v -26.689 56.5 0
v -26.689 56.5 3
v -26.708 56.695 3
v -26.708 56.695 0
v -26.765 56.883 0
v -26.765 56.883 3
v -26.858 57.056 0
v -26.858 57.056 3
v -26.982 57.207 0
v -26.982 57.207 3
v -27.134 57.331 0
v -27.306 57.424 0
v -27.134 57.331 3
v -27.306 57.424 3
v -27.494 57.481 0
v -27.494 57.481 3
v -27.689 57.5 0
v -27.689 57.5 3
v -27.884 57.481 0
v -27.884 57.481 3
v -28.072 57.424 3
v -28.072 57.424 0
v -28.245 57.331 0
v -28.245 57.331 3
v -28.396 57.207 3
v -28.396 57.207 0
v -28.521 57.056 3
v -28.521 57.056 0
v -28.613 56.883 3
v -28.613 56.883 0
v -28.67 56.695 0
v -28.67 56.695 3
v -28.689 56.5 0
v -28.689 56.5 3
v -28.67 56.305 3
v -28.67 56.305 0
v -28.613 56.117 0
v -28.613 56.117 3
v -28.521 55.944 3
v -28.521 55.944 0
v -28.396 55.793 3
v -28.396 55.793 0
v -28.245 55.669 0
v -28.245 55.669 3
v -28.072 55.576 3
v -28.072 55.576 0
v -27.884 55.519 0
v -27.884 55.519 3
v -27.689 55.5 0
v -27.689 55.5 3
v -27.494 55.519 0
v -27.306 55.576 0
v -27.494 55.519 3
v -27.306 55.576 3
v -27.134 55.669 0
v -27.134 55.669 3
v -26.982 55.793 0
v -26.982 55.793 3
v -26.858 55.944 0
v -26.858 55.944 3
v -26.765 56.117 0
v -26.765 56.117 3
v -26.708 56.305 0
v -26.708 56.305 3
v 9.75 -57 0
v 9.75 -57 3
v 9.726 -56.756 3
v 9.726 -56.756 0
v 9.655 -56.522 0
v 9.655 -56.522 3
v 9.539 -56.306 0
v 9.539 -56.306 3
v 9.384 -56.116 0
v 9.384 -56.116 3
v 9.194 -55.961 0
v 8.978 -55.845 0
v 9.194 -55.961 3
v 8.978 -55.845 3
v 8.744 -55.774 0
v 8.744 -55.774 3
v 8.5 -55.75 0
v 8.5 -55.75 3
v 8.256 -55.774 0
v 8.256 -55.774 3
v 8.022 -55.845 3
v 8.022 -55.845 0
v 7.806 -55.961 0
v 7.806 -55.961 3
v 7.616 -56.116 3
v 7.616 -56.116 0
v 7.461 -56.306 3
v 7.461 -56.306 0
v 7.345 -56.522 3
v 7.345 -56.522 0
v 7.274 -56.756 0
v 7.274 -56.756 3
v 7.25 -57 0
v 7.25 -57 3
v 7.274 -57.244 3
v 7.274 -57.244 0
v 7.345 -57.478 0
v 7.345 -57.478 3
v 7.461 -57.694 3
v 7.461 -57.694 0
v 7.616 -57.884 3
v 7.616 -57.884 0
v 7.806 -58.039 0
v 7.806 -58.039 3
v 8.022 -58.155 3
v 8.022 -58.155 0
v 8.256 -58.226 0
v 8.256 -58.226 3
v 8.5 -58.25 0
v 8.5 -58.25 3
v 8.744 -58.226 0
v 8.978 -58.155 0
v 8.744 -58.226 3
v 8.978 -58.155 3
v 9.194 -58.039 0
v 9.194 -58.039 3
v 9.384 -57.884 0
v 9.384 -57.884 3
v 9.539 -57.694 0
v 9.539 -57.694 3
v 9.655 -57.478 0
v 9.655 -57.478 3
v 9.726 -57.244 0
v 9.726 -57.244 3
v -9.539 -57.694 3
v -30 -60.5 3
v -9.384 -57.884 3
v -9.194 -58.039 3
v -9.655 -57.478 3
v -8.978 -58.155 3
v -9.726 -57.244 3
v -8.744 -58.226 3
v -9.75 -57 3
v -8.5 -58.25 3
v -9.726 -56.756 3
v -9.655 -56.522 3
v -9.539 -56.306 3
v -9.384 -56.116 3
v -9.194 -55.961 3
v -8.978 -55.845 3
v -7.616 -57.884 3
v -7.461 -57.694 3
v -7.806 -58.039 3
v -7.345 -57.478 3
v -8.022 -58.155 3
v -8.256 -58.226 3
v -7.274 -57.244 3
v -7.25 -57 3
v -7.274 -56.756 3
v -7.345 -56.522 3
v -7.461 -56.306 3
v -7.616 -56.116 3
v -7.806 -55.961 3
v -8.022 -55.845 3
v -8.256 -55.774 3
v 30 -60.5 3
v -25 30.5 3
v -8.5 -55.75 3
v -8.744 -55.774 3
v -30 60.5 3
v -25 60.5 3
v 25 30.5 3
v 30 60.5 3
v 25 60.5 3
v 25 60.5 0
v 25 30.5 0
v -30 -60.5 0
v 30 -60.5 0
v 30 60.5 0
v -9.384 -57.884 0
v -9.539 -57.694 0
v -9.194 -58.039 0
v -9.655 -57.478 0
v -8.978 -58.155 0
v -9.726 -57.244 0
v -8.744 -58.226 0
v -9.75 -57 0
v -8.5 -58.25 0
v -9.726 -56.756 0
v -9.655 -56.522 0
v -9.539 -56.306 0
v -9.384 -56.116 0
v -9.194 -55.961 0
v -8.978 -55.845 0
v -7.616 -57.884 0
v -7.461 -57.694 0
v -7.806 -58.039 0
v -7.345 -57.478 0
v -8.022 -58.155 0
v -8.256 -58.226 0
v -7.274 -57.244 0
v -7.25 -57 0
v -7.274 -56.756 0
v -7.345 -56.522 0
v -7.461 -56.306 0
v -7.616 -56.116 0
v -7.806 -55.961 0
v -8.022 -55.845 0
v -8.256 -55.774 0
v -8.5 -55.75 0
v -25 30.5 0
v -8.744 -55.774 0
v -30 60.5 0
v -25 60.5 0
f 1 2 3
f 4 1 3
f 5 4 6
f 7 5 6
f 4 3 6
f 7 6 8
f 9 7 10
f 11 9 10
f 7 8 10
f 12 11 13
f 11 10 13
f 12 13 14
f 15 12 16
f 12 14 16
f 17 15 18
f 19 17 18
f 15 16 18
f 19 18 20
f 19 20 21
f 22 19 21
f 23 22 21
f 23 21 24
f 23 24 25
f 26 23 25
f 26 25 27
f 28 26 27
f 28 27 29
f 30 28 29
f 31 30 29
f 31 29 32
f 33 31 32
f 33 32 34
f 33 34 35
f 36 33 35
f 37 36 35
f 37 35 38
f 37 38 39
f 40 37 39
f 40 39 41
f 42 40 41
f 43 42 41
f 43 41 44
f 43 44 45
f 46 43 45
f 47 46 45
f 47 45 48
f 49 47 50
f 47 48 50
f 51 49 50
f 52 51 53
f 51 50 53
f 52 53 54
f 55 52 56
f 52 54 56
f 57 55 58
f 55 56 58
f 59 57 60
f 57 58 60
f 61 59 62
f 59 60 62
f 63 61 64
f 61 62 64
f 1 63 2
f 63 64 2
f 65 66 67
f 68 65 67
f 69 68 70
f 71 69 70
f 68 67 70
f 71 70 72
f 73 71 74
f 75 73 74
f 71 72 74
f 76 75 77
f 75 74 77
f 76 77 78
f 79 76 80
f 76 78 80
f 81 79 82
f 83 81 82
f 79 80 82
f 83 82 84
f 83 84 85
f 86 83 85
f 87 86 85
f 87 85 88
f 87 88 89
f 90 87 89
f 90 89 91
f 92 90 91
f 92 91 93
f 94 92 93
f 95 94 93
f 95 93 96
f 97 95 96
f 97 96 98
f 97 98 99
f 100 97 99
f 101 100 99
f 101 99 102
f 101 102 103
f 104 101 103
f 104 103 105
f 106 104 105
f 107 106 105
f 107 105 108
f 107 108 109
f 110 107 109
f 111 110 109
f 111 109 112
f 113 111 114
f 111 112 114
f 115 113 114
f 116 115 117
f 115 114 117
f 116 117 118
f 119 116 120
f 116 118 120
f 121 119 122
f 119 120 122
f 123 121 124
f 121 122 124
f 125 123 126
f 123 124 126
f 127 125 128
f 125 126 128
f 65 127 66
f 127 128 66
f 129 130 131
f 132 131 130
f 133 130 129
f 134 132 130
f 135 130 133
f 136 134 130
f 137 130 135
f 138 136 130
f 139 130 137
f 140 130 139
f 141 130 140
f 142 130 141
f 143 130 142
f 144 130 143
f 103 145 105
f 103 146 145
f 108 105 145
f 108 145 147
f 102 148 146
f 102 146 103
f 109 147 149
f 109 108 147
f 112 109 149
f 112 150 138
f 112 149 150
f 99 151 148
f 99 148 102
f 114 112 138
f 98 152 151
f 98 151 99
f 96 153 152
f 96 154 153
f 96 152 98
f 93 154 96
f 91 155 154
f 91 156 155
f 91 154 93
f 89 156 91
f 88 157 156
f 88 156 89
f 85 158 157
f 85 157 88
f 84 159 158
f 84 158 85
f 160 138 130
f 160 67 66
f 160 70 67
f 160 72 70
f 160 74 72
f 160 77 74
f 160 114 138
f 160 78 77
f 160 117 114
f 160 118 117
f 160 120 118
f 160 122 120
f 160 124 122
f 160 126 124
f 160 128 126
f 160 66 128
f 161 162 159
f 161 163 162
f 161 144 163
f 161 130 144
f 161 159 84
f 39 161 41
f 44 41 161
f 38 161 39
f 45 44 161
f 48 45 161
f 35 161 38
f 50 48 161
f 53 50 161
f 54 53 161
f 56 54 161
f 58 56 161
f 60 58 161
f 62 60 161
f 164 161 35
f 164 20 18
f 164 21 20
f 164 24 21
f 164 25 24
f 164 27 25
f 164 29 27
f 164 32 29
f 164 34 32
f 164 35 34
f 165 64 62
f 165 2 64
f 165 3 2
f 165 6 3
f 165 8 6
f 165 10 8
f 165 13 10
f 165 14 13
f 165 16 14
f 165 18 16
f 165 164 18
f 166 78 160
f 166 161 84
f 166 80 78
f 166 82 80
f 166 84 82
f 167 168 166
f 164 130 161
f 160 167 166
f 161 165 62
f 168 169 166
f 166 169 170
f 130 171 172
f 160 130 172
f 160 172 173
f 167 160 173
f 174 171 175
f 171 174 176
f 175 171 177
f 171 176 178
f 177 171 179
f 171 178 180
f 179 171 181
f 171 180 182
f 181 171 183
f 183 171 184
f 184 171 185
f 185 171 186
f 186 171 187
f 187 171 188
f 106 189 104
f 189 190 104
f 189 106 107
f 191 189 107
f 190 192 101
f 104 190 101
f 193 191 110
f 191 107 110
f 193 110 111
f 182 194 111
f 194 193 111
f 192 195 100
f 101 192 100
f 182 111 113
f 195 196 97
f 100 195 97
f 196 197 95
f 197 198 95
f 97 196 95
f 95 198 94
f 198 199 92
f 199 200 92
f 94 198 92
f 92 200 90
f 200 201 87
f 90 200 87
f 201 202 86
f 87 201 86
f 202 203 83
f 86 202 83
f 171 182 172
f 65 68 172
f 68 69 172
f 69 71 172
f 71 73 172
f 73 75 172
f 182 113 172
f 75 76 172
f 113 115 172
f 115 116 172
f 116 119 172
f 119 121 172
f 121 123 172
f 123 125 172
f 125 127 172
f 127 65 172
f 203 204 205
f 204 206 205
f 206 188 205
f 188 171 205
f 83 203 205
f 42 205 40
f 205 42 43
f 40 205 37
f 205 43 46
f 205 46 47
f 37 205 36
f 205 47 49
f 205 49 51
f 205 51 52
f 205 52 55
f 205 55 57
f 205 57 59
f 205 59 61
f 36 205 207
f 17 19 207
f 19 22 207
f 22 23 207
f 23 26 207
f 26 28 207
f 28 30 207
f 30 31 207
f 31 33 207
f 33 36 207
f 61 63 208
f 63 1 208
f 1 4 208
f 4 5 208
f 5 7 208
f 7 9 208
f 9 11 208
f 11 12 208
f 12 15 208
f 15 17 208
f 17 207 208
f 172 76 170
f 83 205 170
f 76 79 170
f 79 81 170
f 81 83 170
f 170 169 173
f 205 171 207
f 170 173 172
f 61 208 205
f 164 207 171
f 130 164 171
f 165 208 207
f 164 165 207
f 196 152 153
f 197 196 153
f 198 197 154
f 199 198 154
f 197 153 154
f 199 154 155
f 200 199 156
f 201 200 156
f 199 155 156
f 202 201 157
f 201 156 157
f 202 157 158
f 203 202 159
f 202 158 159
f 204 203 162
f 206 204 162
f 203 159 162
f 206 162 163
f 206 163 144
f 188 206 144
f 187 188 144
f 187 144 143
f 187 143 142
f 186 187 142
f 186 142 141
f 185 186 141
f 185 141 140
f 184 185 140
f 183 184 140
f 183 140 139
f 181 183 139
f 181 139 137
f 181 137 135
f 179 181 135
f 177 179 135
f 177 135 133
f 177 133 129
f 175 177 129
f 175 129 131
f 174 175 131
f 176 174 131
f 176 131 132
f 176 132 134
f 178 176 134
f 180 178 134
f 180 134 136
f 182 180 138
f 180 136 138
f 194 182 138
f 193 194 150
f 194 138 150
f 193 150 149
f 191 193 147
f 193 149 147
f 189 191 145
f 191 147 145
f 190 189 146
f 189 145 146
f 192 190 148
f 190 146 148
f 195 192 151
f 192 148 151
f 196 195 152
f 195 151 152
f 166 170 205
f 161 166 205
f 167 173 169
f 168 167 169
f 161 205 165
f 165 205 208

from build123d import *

# Parameters (mm, degrees)
F1_DEPTH = 2
F2_R     = 1
F3_DEPTH = 25
F4_DEPTH = 3
F6_R     = 1.25
F7_DEPTH = 5
F5_R     = 1
F8_DEPTH = 25


with BuildPart() as f1:
    # F0 (on Top) → F1 (new body)
    with BuildSketch(Plane.XY):
        Polygon((-25, 60.5), (-30, 60.5), (-30, -60.5), (30, -60.5), (30, 60.5), (25, 60.5), (25, 30.5), (-25, 30.5), align=None)
    extrude(amount=F1_DEPTH)

    # F2 (on face) → F3 (cut)
    with BuildSketch(Plane.XY.offset(2)):
        with Locations((-27.5, 57)):
            Circle(F2_R)
    extrude(amount=-F3_DEPTH, mode=Mode.SUBTRACT)

    # F0 (on Top) → F4 (join)
    with BuildSketch(Plane.XY):
        Polygon((-25, 60.5), (-30, 60.5), (-30, -60.5), (30, -60.5), (30, 60.5), (25, 60.5), (25, 30.5), (-25, 30.5), align=None)
    extrude(amount=F4_DEPTH)

    # F6 (on face) → F7 (cut)
    with BuildSketch(Plane.XY.offset(3)):
        with Locations((-8.5, -57)):
            Circle(F6_R)
        with Locations((8.5, -57)):
            Circle(F6_R)
    extrude(amount=-F7_DEPTH, mode=Mode.SUBTRACT)

    # F5 (on face) → F8 (cut)
    with BuildSketch(Plane.XY.offset(3)):
        with Locations((-27.689109, 56.5)):
            Circle(F5_R)
    extrude(amount=-F8_DEPTH, mode=Mode.SUBTRACT)


solid = f1.part
